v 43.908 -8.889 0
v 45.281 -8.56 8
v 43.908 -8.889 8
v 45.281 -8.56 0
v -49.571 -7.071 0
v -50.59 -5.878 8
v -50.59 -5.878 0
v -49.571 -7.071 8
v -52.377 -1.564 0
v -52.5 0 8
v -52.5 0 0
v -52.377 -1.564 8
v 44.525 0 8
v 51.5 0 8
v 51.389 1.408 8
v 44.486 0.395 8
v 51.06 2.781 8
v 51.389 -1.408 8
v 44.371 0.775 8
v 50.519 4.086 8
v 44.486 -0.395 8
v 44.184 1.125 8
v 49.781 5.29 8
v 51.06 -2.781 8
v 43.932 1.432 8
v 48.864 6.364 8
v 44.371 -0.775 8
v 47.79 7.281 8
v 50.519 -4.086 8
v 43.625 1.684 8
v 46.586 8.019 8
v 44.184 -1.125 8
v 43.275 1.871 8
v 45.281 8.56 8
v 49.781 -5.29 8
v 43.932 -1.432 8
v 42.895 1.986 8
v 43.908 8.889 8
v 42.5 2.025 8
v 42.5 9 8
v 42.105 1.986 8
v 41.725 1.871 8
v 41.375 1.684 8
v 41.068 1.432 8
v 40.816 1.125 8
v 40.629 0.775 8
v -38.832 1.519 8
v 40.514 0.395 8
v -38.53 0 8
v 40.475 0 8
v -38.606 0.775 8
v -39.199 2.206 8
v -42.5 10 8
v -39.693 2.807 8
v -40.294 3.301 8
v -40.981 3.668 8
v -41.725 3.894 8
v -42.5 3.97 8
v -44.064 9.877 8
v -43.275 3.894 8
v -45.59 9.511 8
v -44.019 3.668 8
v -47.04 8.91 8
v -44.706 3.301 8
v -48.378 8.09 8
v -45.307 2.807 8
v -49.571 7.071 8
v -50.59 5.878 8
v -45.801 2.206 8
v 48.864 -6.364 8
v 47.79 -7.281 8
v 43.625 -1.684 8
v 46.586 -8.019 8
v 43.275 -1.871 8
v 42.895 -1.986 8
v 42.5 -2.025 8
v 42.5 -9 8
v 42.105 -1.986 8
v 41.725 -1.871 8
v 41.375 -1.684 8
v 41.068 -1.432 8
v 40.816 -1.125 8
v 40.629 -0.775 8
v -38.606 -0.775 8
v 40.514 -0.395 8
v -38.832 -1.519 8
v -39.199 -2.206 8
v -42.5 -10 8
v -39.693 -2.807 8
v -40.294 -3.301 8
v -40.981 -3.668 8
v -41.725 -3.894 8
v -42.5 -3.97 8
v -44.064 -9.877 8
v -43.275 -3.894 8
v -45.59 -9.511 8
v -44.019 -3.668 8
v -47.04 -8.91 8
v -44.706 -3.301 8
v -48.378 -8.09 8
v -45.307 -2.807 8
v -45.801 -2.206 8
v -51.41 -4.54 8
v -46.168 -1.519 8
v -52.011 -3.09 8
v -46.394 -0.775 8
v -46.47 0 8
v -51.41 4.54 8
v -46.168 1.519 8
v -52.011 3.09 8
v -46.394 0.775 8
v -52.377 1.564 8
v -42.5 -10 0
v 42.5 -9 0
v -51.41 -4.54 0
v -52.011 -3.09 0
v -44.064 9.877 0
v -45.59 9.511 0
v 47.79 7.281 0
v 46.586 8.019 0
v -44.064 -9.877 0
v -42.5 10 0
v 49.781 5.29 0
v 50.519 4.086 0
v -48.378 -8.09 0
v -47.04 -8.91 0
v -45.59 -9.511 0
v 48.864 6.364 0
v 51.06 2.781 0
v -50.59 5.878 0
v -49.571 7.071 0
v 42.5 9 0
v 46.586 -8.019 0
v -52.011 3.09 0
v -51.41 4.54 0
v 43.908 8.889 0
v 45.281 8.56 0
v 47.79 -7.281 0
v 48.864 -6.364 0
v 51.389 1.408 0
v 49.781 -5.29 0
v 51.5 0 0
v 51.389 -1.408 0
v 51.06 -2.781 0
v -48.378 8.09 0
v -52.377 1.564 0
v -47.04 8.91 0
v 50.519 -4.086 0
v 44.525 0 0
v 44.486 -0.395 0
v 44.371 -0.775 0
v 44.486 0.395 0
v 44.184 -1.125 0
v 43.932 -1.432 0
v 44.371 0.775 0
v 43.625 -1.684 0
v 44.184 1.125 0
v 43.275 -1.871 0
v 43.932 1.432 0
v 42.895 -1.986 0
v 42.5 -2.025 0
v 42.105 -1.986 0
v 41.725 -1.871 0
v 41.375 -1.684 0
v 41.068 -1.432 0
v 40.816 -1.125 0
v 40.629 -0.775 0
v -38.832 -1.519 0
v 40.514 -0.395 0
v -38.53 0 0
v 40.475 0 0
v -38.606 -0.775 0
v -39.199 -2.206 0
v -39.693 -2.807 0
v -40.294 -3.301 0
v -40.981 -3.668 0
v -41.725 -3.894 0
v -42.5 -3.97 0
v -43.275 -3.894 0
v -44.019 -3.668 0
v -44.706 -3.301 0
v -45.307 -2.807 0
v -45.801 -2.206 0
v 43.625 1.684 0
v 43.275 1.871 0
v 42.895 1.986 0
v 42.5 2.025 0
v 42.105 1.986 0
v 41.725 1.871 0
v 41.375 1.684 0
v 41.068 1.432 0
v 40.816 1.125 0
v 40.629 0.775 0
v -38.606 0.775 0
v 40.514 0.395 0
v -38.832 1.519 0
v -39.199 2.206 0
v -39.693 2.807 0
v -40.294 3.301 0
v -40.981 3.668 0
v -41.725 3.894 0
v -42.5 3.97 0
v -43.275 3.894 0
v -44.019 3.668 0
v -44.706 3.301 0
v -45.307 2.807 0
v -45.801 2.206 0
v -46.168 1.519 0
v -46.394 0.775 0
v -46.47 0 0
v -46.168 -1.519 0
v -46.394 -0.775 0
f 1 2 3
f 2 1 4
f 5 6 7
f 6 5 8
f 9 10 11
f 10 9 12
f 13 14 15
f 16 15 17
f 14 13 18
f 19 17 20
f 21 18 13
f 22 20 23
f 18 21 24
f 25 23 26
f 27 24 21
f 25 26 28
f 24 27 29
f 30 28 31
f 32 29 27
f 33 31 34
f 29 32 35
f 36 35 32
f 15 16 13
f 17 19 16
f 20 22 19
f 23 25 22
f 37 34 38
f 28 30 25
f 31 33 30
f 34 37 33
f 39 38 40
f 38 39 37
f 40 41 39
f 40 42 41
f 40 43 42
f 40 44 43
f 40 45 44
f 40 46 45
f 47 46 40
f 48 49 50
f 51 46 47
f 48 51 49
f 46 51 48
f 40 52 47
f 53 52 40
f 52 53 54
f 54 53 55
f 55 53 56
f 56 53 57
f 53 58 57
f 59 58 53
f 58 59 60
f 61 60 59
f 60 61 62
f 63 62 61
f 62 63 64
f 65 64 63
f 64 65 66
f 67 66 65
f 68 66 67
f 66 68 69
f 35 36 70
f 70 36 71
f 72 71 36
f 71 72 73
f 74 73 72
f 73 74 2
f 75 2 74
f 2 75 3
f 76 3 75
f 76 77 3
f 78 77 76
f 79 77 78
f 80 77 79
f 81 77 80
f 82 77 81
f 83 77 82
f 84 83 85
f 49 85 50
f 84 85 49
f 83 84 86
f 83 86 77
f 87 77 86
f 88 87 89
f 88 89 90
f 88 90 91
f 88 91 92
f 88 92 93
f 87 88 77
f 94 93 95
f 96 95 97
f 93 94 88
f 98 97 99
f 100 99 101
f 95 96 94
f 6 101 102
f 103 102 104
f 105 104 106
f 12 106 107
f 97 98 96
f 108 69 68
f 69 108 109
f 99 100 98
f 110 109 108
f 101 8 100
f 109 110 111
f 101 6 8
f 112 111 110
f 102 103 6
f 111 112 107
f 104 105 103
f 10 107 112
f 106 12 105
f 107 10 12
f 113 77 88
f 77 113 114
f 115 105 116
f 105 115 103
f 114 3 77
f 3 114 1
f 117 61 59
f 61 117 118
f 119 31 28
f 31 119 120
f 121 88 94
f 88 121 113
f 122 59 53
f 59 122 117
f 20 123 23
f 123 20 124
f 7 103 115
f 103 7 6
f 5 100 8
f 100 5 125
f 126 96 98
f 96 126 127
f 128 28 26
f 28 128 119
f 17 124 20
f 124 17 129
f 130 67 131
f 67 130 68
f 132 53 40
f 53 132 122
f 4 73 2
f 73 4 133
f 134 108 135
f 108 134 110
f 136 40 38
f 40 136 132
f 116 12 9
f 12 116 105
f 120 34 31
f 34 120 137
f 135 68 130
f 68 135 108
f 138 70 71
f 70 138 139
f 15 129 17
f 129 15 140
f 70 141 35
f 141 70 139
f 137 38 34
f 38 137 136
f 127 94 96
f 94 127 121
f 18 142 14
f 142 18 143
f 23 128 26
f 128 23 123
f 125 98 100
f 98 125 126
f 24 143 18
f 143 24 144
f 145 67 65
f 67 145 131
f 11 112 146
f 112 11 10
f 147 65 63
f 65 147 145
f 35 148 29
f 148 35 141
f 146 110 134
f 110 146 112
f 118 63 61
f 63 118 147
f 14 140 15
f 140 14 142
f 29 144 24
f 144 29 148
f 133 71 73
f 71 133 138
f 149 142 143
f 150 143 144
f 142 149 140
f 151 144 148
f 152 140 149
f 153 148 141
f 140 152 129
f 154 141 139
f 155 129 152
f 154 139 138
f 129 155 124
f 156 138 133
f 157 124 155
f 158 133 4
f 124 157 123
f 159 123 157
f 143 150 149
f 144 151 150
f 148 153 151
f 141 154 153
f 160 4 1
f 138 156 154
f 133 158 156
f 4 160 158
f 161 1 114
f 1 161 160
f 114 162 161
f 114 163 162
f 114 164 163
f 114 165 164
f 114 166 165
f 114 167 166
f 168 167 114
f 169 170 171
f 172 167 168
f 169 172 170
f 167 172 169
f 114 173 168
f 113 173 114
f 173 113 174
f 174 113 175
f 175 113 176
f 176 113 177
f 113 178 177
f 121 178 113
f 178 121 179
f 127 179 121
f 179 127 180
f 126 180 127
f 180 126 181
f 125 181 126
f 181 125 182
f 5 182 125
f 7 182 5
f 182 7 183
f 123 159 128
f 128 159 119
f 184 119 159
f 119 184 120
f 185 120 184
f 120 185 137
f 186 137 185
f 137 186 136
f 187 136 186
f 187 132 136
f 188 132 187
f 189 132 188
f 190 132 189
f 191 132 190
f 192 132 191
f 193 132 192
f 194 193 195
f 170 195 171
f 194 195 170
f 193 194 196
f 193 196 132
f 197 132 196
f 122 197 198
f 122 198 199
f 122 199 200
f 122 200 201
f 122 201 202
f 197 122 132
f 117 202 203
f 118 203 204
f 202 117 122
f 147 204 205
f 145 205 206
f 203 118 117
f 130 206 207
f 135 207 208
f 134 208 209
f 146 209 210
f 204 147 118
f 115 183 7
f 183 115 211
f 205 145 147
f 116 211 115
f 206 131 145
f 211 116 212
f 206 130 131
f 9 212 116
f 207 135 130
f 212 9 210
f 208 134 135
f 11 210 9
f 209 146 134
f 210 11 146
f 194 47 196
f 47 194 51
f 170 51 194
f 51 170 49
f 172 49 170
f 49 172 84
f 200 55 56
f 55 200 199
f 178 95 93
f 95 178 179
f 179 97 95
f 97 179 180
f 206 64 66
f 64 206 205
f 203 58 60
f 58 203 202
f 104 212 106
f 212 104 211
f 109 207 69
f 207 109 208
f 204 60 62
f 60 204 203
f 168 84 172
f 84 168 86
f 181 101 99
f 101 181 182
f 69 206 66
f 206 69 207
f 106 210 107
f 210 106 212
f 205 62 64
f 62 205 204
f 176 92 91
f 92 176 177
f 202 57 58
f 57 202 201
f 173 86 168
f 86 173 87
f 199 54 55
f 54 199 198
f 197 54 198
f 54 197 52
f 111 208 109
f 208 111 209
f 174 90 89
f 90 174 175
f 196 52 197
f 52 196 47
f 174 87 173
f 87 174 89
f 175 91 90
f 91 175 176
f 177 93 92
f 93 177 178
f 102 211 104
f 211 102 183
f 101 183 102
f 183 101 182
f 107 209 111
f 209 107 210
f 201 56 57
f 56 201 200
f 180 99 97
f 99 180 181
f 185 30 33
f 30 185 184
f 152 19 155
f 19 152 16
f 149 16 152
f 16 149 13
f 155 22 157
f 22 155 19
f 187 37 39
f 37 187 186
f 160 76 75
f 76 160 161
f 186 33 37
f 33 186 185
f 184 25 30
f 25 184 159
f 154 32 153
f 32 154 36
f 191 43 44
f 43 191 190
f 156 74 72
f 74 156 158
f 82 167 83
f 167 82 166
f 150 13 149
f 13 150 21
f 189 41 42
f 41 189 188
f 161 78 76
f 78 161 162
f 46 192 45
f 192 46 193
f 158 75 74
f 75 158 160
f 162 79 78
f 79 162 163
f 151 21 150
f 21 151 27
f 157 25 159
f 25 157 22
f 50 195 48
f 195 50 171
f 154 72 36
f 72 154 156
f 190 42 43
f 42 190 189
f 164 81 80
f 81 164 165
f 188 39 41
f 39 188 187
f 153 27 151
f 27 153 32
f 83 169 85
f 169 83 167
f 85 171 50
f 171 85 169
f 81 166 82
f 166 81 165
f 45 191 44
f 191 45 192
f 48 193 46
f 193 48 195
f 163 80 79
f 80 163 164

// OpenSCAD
$fn = 32;

// ----------------------------------------------------------------------
// Lever: 85 mm between the bosses, 8 mm thick, smooth outline
// ----------------------------------------------------------------------

// --- parameters (mm) ---
lever_l = 85;             // distance between the boss centres
boss_a = 20;              // first boss diameter
boss_b = 18;              // second boss diameter
bore_a = 7.94;            // first bore
bore_b = 4.05;            // second bore
lever_t = 8;              // lever thickness

lever_profile = [[-52.5, 0], [-52.377, -1.564], [-52.011, -3.09], [-51.41, -4.54], [-50.59, -5.878], [-49.571, -7.071], [-48.378, -8.09], [-47.04, -8.91], [-45.59, -9.511], [-44.064, -9.877], [-42.5, -10], [42.5, -9], [43.908, -8.889], [45.281, -8.56], [46.586, -8.019], [47.79, -7.281], [48.864, -6.364], [49.781, -5.29], [50.519, -4.086], [51.06, -2.781], [51.389, -1.408], [51.5, 0], [51.389, 1.408], [51.06, 2.781], [50.519, 4.086], [49.781, 5.29], [48.864, 6.364], [47.79, 7.281], [46.586, 8.019], [45.281, 8.56], [43.908, 8.889], [42.5, 9], [-42.5, 10], [-44.064, 9.877], [-45.59, 9.511], [-47.04, 8.91], [-48.378, 8.09], [-49.571, 7.071], [-50.59, 5.878], [-51.41, 4.54], [-52.011, 3.09], [-52.377, 1.564]];

difference() {
  linear_extrude(height = lever_t) polygon(lever_profile);
  translate([-42.5, 0, -2.5]) cylinder(h = lever_t + 5, d = bore_a);
  translate([42.5, 0, -2.5]) cylinder(h = lever_t + 5, d = bore_b);
}
